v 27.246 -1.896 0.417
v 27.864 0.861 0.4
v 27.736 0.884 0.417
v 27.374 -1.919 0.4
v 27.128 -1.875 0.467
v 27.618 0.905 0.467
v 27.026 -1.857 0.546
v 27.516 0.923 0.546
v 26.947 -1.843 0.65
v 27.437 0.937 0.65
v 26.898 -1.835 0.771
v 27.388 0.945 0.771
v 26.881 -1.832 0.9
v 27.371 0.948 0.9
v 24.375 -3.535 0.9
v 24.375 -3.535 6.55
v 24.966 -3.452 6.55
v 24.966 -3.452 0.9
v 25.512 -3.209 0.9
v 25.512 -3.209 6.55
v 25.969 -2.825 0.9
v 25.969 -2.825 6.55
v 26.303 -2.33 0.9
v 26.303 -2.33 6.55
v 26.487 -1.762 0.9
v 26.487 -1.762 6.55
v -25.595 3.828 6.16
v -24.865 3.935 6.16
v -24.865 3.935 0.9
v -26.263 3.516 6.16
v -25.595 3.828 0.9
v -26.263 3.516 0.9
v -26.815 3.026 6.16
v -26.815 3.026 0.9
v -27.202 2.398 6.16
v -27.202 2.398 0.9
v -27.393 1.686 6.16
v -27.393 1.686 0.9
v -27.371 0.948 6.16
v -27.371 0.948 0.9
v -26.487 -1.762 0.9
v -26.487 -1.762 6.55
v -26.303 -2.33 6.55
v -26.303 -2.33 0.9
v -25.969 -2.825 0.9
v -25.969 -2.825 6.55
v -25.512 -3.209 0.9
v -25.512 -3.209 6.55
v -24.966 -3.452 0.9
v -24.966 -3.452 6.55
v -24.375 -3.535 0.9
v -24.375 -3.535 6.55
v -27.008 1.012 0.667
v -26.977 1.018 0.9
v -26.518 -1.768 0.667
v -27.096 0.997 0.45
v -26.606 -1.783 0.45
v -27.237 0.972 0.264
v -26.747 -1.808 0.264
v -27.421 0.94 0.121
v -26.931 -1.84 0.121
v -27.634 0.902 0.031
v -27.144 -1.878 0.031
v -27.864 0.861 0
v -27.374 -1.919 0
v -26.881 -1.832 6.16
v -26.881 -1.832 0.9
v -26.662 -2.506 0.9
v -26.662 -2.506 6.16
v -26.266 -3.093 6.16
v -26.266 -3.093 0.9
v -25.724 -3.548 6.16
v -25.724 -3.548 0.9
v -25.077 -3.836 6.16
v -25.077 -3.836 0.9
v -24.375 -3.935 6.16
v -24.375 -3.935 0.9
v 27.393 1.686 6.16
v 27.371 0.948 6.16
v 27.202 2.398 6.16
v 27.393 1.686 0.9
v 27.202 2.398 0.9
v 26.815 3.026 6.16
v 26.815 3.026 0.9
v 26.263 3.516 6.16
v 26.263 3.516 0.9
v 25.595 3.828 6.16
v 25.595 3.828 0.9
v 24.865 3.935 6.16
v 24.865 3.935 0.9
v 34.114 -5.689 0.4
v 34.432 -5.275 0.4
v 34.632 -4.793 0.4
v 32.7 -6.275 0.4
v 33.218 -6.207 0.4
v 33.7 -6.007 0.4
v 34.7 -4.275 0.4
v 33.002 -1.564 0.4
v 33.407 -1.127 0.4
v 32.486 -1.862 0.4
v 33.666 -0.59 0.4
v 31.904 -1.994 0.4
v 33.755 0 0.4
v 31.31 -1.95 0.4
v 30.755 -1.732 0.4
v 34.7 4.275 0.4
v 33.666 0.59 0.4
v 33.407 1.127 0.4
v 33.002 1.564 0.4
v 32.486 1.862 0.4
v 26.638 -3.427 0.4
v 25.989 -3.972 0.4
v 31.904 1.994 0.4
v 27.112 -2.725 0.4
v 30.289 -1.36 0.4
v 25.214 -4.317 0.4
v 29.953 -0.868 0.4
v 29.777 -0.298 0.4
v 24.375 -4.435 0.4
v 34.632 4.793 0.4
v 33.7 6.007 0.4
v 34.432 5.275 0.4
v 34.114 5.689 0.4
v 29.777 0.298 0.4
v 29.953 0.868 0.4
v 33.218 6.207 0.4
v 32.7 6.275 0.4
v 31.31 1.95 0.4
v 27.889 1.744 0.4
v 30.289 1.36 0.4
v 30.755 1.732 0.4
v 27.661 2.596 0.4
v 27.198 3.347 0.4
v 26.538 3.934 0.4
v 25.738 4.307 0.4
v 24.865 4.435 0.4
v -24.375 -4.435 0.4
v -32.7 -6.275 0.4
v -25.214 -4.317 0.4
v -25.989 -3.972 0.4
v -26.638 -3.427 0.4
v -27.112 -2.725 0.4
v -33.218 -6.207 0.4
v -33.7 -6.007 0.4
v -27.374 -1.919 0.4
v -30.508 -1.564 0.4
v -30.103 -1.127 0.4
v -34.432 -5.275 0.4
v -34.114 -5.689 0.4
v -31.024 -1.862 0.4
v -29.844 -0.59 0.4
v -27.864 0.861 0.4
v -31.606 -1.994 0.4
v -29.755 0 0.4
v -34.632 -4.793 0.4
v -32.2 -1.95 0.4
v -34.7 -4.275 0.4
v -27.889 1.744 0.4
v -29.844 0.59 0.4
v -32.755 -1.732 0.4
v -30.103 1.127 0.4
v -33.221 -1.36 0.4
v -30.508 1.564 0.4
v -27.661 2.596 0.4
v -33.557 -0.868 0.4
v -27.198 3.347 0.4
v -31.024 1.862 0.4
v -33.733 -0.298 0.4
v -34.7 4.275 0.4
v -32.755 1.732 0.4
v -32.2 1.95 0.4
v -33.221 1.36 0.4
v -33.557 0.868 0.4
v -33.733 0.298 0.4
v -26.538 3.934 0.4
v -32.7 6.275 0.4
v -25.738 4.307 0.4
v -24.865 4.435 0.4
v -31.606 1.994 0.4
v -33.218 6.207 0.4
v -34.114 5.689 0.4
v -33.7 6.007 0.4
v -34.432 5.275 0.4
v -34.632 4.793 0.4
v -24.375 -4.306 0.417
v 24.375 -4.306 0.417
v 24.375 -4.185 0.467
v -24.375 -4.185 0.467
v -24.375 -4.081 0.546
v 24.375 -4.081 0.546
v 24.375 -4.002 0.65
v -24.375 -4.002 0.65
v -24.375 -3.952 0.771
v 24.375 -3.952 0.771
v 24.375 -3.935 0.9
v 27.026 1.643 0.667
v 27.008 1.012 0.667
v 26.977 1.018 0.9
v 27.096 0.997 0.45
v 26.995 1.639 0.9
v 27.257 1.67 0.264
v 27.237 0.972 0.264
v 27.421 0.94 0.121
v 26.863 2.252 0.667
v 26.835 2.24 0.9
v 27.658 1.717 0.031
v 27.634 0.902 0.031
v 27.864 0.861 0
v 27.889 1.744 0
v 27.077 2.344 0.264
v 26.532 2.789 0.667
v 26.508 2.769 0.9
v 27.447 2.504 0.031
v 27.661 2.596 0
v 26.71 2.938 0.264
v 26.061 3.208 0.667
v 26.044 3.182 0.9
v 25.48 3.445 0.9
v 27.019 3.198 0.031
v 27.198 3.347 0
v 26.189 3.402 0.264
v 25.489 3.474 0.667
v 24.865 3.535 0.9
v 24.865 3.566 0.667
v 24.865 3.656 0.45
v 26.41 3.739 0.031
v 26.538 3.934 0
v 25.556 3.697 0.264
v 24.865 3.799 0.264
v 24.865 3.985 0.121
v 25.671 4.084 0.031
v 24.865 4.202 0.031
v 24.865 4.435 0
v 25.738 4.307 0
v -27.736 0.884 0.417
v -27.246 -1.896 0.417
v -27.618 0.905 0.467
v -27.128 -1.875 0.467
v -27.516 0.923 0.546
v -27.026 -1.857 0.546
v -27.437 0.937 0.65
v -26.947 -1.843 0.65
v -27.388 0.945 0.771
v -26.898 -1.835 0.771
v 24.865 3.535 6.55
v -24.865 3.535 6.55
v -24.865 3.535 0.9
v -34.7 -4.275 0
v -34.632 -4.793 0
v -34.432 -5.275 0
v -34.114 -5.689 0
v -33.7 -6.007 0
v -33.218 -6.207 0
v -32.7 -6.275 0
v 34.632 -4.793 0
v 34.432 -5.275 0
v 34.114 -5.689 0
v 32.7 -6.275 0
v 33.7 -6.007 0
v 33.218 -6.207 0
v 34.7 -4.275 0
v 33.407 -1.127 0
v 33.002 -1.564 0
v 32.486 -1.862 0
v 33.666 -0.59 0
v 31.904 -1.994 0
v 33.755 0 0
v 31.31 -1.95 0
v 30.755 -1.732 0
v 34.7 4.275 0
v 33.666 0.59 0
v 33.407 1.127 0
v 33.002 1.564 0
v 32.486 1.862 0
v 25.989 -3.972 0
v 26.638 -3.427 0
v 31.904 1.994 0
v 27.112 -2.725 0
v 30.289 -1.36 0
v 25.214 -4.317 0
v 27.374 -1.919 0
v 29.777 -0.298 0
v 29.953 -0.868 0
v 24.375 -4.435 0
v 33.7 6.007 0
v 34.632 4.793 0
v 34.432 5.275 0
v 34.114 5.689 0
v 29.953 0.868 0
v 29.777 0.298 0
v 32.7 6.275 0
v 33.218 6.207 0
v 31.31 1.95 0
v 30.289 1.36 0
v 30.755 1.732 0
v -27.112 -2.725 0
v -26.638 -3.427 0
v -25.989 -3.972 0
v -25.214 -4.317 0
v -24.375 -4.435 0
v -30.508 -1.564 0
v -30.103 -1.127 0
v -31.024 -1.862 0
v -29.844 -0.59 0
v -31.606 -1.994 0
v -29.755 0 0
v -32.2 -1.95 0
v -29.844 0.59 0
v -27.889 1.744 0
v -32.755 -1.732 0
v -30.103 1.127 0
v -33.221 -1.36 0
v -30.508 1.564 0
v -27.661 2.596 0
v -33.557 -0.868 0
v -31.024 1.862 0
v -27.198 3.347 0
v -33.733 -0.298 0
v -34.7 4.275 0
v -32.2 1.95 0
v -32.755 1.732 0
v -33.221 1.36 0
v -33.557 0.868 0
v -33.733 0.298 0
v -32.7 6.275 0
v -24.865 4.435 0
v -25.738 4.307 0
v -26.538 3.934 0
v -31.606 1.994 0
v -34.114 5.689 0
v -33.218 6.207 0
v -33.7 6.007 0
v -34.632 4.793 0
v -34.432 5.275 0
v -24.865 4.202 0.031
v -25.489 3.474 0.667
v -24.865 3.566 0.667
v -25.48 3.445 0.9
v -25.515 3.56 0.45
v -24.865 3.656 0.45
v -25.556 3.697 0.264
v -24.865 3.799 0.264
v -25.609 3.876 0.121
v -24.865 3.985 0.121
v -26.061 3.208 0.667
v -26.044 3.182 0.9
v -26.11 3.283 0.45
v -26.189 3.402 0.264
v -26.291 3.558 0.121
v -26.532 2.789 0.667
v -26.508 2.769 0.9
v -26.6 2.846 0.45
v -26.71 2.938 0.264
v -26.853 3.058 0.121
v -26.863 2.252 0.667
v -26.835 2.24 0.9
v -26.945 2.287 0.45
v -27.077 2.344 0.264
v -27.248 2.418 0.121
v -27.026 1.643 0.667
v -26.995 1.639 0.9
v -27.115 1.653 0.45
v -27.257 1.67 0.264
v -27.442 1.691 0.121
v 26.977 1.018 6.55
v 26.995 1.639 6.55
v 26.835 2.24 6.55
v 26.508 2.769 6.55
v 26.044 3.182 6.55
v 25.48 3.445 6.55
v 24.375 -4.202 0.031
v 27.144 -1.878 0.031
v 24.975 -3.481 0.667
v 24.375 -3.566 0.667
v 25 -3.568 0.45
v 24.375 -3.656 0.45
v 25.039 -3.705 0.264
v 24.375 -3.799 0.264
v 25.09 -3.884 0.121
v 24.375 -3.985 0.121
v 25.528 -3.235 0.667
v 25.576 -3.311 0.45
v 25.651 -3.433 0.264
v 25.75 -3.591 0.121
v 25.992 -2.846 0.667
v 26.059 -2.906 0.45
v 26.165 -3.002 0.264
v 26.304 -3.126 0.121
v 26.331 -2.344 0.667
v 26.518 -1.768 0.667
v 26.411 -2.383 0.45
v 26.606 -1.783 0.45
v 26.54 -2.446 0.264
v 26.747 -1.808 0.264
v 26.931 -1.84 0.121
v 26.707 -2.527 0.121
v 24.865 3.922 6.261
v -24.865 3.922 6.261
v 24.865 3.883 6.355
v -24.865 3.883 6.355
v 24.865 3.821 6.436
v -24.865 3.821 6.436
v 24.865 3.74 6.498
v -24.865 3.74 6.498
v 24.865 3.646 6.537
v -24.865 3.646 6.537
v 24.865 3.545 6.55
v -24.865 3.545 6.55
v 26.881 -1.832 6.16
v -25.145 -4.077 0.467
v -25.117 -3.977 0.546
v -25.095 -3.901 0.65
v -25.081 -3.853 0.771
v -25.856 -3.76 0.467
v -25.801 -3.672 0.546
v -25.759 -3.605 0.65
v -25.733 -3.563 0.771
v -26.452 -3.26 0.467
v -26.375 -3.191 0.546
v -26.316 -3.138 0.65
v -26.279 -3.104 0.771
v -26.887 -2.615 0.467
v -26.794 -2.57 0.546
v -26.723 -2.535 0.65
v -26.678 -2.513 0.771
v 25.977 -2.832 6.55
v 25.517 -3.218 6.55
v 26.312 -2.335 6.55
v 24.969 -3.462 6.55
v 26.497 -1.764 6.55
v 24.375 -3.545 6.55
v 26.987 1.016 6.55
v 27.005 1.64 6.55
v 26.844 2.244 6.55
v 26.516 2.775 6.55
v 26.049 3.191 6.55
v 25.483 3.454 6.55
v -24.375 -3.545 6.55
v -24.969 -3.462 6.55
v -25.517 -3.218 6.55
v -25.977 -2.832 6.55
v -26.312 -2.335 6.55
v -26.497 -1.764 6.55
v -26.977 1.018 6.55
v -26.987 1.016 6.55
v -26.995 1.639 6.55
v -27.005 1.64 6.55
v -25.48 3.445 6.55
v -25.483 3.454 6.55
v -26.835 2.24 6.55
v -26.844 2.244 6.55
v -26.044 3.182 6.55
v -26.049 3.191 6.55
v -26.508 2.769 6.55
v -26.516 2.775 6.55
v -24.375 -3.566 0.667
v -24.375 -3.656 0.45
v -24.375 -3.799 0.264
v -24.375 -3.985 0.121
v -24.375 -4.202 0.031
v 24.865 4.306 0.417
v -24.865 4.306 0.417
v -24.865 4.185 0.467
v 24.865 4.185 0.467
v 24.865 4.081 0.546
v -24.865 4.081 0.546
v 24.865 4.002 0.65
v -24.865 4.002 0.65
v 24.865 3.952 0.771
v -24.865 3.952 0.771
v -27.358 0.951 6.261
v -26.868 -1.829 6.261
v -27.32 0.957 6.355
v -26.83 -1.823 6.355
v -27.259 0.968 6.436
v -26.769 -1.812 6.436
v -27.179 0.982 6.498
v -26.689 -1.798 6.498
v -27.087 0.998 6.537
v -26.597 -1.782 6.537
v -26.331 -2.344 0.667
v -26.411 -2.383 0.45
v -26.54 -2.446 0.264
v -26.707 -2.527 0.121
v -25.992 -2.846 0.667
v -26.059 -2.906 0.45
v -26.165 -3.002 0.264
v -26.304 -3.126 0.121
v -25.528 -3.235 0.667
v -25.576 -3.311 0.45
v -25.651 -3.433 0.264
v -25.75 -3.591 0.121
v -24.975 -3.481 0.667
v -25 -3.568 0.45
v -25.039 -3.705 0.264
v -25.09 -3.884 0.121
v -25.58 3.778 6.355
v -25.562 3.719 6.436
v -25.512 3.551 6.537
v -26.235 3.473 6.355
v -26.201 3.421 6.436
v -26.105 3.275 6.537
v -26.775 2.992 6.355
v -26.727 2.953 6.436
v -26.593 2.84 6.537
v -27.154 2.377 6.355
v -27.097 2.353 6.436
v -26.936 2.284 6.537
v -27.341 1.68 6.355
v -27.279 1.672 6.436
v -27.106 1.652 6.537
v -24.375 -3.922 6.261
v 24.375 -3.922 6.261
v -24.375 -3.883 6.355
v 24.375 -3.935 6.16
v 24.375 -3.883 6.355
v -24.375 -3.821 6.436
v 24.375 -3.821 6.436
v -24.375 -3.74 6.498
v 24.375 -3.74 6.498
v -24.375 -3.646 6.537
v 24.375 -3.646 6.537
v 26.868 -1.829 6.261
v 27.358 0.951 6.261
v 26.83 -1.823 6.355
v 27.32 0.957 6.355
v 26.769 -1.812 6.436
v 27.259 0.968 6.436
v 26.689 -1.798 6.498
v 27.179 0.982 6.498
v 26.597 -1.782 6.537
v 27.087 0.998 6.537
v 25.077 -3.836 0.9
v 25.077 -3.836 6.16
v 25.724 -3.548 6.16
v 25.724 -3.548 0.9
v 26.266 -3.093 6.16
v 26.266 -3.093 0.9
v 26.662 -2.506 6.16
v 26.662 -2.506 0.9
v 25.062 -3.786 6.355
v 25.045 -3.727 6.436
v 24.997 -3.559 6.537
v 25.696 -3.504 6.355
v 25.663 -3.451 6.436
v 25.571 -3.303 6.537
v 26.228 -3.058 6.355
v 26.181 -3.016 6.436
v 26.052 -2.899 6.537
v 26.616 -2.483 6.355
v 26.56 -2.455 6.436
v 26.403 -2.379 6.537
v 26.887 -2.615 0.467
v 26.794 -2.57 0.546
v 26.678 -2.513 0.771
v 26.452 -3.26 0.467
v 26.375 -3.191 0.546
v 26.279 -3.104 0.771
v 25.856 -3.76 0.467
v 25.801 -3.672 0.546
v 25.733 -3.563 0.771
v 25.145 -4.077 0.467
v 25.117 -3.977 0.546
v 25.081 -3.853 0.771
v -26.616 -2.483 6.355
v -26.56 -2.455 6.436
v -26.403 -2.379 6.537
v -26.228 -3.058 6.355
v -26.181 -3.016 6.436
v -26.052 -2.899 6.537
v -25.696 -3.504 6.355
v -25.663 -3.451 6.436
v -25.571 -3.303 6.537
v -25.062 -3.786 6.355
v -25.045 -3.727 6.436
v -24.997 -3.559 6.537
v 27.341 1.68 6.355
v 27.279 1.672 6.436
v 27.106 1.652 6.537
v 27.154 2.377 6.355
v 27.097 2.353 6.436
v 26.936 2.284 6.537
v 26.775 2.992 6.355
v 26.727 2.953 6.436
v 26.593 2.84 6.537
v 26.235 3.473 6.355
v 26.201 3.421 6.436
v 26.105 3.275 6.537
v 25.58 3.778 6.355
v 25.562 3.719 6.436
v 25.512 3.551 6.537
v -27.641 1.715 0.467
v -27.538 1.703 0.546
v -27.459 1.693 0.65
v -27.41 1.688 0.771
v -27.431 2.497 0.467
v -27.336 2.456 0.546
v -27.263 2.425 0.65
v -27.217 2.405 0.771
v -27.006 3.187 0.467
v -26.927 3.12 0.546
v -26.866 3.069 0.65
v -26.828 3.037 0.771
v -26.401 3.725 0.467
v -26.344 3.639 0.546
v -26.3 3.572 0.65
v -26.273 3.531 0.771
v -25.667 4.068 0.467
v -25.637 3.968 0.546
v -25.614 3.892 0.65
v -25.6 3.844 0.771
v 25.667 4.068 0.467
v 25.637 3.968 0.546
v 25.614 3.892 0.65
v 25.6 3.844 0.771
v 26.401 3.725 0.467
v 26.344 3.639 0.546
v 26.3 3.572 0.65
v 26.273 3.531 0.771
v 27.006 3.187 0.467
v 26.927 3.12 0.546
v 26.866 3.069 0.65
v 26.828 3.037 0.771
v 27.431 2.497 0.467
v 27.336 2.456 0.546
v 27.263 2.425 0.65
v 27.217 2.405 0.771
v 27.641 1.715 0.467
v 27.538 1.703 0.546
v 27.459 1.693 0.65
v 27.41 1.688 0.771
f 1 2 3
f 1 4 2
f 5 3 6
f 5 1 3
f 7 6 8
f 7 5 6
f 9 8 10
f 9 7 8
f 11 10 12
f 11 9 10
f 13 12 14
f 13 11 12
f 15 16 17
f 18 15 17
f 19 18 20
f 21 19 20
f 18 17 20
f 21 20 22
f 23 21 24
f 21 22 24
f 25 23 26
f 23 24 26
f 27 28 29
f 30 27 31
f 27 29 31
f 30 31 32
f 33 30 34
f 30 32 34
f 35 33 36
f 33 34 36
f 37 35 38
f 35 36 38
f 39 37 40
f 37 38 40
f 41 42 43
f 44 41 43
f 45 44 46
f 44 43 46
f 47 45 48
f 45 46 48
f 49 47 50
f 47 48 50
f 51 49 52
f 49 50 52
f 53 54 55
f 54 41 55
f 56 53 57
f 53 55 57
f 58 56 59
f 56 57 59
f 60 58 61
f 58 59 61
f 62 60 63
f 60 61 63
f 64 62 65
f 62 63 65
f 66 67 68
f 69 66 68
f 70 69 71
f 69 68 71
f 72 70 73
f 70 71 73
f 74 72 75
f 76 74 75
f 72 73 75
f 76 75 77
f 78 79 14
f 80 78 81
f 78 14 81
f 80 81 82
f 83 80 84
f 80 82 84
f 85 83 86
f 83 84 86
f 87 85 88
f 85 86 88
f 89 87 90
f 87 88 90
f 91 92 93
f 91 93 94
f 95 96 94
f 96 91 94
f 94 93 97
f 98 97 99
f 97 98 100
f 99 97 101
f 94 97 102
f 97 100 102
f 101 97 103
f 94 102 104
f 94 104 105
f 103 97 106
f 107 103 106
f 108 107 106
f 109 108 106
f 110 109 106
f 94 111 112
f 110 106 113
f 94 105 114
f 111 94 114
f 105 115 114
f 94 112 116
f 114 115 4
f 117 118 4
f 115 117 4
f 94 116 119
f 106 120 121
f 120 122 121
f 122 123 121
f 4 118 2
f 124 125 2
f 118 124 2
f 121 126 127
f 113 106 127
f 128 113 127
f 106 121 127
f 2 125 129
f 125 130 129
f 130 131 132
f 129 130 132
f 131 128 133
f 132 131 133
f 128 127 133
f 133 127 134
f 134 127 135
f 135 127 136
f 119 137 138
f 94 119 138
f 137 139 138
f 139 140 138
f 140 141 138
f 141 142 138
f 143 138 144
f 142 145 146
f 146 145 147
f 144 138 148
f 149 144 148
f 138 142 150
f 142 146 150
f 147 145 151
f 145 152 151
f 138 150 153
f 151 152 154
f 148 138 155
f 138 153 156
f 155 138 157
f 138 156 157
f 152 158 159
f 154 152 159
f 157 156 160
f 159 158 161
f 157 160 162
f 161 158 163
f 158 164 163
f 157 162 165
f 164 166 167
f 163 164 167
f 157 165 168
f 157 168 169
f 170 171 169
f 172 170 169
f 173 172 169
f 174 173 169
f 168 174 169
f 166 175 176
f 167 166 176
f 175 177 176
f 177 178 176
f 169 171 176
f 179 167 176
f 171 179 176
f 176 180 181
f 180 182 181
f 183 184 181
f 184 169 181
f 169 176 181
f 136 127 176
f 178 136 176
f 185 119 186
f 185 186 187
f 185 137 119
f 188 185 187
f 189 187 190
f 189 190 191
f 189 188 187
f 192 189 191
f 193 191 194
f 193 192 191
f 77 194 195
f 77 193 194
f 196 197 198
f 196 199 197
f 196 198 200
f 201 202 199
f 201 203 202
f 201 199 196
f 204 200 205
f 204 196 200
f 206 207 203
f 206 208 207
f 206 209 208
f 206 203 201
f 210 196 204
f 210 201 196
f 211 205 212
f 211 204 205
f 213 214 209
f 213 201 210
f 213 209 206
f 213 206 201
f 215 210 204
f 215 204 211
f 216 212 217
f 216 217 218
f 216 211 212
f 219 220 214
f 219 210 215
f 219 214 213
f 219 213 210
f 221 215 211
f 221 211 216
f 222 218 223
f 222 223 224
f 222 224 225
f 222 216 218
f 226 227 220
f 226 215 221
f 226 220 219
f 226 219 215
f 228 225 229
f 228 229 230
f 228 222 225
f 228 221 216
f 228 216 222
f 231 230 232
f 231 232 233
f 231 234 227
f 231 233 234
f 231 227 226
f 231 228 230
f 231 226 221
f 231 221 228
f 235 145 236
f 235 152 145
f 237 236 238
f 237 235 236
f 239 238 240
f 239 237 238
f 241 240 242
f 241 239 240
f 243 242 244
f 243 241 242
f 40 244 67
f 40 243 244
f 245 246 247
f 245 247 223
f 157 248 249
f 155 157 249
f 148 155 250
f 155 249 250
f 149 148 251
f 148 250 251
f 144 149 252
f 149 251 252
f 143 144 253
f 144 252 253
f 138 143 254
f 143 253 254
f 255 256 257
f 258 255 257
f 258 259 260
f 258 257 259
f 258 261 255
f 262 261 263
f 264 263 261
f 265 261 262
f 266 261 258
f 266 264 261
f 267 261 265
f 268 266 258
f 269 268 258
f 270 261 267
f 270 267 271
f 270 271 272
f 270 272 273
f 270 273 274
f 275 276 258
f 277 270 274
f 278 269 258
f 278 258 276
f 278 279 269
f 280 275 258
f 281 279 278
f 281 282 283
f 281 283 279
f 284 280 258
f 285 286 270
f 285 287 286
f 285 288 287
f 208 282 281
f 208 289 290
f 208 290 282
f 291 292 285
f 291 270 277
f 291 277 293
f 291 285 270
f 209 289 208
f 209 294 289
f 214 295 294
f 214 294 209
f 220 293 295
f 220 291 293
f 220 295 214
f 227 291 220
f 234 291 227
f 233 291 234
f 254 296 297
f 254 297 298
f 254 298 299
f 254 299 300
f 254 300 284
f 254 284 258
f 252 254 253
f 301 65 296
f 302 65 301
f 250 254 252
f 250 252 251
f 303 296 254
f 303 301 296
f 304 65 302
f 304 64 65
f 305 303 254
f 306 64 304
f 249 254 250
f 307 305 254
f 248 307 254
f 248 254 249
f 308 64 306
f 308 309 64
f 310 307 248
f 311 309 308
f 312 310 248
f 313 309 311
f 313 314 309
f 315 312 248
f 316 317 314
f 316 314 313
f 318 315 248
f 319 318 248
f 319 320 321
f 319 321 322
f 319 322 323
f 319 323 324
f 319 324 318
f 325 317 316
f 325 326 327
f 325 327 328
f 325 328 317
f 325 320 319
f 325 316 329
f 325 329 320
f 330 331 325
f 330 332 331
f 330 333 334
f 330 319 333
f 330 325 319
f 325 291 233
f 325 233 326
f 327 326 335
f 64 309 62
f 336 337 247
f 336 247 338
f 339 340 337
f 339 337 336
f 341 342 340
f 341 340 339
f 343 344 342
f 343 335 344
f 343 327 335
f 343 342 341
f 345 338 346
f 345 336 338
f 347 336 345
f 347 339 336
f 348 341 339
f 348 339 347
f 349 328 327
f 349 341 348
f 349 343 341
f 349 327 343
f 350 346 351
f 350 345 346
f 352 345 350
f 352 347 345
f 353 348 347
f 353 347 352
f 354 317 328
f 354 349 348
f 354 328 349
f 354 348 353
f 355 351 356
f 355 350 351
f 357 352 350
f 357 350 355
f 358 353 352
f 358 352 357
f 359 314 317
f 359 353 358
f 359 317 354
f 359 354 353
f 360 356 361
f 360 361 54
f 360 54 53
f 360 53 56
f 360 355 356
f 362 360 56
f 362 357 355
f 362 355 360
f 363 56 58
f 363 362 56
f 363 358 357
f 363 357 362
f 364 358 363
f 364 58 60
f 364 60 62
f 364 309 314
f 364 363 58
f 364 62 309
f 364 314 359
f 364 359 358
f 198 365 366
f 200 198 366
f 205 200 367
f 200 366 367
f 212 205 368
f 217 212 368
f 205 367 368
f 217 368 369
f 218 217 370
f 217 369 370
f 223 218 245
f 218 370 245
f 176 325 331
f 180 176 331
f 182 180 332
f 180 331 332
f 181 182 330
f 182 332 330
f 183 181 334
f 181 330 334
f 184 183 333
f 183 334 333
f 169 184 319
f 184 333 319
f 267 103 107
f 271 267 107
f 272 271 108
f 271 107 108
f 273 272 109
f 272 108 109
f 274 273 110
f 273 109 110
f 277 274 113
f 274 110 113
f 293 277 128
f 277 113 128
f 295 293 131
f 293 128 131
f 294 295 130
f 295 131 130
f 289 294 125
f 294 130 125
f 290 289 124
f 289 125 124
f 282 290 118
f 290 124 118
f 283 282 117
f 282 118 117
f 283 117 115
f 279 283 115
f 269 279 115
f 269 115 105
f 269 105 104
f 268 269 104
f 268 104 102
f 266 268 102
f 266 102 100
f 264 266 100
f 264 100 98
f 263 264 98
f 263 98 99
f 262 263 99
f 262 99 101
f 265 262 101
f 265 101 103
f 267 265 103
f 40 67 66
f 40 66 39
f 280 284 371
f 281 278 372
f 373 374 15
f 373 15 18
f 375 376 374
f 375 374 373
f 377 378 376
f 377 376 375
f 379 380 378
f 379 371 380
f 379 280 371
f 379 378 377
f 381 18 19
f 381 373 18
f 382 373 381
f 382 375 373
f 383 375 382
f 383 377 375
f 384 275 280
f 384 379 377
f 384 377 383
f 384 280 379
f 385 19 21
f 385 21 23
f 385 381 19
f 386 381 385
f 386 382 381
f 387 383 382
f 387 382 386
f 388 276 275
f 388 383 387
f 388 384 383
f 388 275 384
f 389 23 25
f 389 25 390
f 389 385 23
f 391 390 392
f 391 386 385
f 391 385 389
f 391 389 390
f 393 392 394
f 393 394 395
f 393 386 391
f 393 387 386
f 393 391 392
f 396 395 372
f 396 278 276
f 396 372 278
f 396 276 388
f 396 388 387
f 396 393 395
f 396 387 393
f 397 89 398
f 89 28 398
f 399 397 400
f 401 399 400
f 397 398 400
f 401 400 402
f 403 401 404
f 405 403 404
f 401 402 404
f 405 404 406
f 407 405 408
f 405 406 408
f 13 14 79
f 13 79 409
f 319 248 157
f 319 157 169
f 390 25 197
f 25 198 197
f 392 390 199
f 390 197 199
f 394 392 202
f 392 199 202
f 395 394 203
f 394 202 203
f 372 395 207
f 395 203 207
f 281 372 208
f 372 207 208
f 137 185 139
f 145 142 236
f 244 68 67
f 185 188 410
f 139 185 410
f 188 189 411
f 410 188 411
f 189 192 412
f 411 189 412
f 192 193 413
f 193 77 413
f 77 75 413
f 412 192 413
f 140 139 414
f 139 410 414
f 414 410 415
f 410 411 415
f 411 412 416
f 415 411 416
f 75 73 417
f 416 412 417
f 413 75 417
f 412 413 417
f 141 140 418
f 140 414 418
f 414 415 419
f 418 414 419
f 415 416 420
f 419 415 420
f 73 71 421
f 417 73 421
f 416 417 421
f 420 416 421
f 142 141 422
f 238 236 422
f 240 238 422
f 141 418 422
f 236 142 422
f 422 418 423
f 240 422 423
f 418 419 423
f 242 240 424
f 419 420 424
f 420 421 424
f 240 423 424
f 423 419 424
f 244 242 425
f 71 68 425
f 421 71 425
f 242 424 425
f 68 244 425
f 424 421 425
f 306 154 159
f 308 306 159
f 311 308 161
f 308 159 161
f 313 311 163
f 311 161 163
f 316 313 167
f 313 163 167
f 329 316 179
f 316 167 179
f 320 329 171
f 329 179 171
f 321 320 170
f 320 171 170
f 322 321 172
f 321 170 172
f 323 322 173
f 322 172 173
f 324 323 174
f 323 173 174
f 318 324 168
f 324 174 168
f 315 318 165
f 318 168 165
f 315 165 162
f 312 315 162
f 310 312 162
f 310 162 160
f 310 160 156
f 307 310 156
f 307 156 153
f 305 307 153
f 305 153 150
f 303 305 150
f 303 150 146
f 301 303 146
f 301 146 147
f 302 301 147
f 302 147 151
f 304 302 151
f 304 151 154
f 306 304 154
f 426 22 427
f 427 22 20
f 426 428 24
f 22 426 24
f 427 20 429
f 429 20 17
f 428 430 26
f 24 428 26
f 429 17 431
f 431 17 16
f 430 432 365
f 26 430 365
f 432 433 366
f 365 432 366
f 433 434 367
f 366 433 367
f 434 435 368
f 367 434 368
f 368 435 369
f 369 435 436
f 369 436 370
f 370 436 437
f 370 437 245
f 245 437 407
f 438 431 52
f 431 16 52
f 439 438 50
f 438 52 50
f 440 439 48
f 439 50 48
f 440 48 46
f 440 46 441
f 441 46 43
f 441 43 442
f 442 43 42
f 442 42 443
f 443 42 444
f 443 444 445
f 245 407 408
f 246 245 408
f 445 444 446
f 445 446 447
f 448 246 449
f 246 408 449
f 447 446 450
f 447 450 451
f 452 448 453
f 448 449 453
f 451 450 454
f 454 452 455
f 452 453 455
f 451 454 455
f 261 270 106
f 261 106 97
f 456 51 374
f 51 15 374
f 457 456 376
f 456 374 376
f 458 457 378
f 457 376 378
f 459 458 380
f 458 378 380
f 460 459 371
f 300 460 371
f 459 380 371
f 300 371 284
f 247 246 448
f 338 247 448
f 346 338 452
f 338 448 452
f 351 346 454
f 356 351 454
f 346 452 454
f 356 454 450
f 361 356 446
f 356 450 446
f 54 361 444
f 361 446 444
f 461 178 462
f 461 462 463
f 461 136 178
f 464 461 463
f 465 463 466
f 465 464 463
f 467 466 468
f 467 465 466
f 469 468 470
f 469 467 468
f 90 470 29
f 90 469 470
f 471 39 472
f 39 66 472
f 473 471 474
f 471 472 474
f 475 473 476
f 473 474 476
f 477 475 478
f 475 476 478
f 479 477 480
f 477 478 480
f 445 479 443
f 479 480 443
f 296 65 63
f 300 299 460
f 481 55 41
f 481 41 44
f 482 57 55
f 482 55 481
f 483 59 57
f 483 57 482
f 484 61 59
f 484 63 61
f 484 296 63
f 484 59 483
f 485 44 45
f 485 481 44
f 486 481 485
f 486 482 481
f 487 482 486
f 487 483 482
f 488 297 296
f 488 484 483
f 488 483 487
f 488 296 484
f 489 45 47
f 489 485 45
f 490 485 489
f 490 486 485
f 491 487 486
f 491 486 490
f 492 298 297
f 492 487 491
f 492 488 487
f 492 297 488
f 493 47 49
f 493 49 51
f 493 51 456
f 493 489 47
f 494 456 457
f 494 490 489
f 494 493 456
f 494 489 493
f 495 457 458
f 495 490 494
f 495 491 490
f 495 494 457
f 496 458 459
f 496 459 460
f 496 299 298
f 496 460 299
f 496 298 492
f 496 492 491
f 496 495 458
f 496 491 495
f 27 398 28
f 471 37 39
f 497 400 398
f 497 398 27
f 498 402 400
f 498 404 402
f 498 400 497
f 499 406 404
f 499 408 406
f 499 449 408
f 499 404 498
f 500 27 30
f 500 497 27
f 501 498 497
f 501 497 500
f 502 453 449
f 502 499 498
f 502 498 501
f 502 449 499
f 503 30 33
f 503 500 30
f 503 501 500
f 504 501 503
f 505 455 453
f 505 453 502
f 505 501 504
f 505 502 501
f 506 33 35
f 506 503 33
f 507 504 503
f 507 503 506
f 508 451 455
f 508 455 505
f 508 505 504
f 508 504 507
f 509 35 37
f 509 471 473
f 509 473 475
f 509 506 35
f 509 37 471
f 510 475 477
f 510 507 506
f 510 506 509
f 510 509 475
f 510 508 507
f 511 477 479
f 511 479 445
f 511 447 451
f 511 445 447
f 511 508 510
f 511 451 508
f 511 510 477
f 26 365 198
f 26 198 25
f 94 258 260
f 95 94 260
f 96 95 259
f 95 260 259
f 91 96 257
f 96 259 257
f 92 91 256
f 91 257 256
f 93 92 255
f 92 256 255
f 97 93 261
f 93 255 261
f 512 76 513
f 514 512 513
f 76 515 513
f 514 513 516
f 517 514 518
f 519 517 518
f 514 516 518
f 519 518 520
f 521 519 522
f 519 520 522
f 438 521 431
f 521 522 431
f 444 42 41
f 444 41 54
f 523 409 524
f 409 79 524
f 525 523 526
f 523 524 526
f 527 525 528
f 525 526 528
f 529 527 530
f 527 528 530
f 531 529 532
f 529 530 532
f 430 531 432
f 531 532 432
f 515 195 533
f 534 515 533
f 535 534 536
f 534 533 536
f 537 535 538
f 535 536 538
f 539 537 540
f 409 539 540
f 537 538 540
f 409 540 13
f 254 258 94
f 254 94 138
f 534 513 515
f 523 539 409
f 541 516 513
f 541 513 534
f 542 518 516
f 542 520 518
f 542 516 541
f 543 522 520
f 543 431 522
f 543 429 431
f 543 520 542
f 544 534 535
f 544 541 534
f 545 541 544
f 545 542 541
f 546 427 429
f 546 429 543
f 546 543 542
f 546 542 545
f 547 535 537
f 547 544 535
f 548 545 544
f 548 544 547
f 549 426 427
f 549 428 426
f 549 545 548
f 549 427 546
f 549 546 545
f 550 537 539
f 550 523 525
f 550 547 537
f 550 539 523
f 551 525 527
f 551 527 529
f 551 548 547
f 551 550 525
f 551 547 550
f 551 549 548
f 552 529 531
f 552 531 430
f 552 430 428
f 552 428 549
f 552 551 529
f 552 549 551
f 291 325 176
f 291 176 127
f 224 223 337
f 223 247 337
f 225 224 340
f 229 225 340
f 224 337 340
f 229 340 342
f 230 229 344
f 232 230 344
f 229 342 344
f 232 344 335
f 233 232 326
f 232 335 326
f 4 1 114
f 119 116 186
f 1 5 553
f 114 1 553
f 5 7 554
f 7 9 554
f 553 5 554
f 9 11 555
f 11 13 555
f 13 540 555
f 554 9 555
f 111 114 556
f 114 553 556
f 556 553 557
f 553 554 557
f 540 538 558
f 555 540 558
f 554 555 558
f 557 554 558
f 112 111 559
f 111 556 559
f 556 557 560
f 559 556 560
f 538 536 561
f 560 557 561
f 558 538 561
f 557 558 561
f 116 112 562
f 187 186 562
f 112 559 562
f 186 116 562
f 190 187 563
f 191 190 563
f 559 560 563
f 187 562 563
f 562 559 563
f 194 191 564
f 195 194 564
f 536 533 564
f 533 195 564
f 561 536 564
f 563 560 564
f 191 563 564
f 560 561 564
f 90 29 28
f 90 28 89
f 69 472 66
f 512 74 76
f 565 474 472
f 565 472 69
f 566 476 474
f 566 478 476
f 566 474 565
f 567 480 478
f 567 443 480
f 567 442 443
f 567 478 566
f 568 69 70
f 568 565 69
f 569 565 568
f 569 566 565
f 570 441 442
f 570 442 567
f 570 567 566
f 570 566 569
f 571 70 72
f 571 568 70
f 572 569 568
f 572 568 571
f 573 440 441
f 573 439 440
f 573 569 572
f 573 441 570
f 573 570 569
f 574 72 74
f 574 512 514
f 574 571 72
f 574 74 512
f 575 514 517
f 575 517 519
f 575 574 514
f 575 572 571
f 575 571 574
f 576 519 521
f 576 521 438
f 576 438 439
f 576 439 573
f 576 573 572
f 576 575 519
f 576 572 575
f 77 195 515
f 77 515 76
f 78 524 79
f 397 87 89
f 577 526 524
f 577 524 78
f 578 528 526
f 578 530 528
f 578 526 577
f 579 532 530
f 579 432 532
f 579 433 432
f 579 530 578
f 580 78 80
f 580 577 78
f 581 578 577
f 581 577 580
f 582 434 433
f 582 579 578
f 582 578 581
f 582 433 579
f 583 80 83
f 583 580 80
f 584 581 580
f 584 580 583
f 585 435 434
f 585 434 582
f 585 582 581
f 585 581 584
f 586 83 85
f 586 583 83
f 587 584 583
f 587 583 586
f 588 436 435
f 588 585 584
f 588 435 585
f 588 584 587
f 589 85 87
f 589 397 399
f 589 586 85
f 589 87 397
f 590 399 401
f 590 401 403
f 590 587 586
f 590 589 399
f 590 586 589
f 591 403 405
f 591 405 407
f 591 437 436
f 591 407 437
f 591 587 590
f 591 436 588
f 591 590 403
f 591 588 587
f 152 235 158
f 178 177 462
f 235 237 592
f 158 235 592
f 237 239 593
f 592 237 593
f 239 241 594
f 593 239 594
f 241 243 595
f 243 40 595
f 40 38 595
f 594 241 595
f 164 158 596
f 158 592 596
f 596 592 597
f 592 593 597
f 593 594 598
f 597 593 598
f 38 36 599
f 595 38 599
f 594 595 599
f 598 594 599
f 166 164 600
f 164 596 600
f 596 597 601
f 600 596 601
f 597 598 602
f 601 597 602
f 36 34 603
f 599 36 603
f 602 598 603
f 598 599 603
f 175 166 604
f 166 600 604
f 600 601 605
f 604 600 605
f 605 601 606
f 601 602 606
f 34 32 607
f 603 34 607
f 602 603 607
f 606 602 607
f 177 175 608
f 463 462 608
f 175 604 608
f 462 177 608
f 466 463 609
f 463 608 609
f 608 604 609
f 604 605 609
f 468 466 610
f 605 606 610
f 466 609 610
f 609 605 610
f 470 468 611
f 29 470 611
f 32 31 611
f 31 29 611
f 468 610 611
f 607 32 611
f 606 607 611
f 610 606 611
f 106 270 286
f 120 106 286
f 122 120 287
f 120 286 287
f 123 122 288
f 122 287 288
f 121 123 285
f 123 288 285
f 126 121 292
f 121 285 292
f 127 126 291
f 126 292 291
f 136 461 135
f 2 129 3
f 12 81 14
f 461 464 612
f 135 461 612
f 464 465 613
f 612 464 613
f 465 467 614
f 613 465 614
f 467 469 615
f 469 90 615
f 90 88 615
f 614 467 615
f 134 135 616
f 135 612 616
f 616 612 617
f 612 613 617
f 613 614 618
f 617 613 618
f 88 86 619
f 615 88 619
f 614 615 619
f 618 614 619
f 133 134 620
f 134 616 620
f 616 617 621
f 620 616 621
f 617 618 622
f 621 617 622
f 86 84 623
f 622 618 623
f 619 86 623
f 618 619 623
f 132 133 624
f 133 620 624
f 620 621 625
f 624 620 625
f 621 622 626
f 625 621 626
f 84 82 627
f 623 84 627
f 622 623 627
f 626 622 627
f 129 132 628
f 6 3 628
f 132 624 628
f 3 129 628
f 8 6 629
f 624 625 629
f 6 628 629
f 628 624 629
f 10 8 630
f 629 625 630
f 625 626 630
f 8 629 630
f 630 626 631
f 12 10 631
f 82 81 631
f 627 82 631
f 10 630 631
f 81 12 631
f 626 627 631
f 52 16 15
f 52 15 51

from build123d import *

# Parameters (mm, degrees)
PAD_DEPTH       = 0.4
SKETCH001_R     = 2
POCKET_DEPTH    = 5
PAD001_DEPTH    = 6.15
POCKET001_DEPTH = 6.551
FILLET_R        = 0.5
FILLET001_R     = 0.39
FILLET002_R     = 0.9


with BuildPart() as part:
    # Sketch → Pad (new body)
    with BuildSketch(Plane.XY):
        with BuildLine():
            Line((-32.7, 6.275), (32.7, 6.275))
            ThreePointArc((34.7, 4.275), (34.114214, 5.689214), (32.7, 6.275))
            Line((34.7, 4.275), (34.7, -4.275))
            ThreePointArc((32.7, -6.275), (34.114214, -5.689214), (34.7, -4.275))
            Line((32.7, -6.275), (-32.7, -6.275))
            ThreePointArc((-34.7, -4.275), (-34.114214, -5.689214), (-32.7, -6.275))
            Line((-34.7, -4.275), (-34.7, 4.275))
            ThreePointArc((-32.7, 6.275), (-34.114214, 5.689214), (-34.7, 4.275))
        make_face()
    extrude(amount=PAD_DEPTH)

    # Sketch001 (on Face10 of Pad) → Pocket (cut)
    with BuildSketch(Plane.XY.offset(0.4)):
        with Locations((-31.755, 0)):
            Circle(SKETCH001_R)
        with Locations((31.755, 0)):
            Circle(SKETCH001_R)
    extrude(amount=-POCKET_DEPTH, mode=Mode.SUBTRACT)

    # Sketch002 (on Face5 of Pocket) → Pad001 (join)
    with BuildSketch(Plane.XY.offset(0.4)):
        with BuildLine():
            Line((-24.865, 3.935), (24.865, 3.935))
            ThreePointArc((27.371365, 0.948231), (26.814529, 3.025959), (24.865, 3.935))
            Line((27.371365, 0.948231), (26.881365, -1.831769))
            ThreePointArc((24.375, -3.935), (26.010959, -3.339529), (26.881365, -1.831769))
            Line((24.375, -3.935), (-24.375, -3.935))
            ThreePointArc((-26.881365, -1.831769), (-26.010959, -3.339529), (-24.375, -3.935))
            Line((-26.881365, -1.831769), (-27.371365, 0.948231))
            ThreePointArc((-24.865, 3.935), (-26.814529, 3.025959), (-27.371365, 0.948231))
        make_face()
    extrude(amount=PAD001_DEPTH)

    # Sketch003 (on Face21 of Pad001) → Pocket001 (cut, through all)
    with BuildSketch(Plane.XY.offset(6.55)):
        with BuildLine():
            Line((-24.865, 3.535), (24.865, 3.535))
            ThreePointArc((26.977437, 1.017664), (26.50812, 2.768834), (24.865, 3.535))
            Line((26.977437, 1.017664), (26.487437, -1.762336))
            ThreePointArc((24.375, -3.535), (25.753834, -3.03312), (26.487437, -1.762336))
            Line((24.375, -3.535), (-24.375, -3.535))
            ThreePointArc((-26.487437, -1.762336), (-25.753834, -3.03312), (-24.375, -3.535))
            Line((-26.487437, -1.762336), (-26.977437, 1.017664))
            ThreePointArc((-24.865, 3.535), (-26.50812, 2.768834), (-26.977437, 1.017664))
        make_face()
    extrude(amount=-POCKET001_DEPTH, mode=Mode.SUBTRACT)

    # Fillet
    fillet_edges = [part.edges().sort_by_distance(p)[0] for p in [
        (0, -3.935, 0.4),
    ]]
    fillet(fillet_edges, radius=FILLET_R)

    # Fillet001
    fillet001_edges = [part.edges().sort_by_distance(p)[0] for p in [
        (-26.010959, -3.339529, 6.55),
    ]]
    fillet(fillet001_edges, radius=FILLET001_R)

    # Fillet002
    fillet002_edges = [part.edges().sort_by_distance(p)[0] for p in [
        (0, 3.535, 0),
    ]]
    fillet(fillet002_edges, radius=FILLET002_R)


solid = part.part
